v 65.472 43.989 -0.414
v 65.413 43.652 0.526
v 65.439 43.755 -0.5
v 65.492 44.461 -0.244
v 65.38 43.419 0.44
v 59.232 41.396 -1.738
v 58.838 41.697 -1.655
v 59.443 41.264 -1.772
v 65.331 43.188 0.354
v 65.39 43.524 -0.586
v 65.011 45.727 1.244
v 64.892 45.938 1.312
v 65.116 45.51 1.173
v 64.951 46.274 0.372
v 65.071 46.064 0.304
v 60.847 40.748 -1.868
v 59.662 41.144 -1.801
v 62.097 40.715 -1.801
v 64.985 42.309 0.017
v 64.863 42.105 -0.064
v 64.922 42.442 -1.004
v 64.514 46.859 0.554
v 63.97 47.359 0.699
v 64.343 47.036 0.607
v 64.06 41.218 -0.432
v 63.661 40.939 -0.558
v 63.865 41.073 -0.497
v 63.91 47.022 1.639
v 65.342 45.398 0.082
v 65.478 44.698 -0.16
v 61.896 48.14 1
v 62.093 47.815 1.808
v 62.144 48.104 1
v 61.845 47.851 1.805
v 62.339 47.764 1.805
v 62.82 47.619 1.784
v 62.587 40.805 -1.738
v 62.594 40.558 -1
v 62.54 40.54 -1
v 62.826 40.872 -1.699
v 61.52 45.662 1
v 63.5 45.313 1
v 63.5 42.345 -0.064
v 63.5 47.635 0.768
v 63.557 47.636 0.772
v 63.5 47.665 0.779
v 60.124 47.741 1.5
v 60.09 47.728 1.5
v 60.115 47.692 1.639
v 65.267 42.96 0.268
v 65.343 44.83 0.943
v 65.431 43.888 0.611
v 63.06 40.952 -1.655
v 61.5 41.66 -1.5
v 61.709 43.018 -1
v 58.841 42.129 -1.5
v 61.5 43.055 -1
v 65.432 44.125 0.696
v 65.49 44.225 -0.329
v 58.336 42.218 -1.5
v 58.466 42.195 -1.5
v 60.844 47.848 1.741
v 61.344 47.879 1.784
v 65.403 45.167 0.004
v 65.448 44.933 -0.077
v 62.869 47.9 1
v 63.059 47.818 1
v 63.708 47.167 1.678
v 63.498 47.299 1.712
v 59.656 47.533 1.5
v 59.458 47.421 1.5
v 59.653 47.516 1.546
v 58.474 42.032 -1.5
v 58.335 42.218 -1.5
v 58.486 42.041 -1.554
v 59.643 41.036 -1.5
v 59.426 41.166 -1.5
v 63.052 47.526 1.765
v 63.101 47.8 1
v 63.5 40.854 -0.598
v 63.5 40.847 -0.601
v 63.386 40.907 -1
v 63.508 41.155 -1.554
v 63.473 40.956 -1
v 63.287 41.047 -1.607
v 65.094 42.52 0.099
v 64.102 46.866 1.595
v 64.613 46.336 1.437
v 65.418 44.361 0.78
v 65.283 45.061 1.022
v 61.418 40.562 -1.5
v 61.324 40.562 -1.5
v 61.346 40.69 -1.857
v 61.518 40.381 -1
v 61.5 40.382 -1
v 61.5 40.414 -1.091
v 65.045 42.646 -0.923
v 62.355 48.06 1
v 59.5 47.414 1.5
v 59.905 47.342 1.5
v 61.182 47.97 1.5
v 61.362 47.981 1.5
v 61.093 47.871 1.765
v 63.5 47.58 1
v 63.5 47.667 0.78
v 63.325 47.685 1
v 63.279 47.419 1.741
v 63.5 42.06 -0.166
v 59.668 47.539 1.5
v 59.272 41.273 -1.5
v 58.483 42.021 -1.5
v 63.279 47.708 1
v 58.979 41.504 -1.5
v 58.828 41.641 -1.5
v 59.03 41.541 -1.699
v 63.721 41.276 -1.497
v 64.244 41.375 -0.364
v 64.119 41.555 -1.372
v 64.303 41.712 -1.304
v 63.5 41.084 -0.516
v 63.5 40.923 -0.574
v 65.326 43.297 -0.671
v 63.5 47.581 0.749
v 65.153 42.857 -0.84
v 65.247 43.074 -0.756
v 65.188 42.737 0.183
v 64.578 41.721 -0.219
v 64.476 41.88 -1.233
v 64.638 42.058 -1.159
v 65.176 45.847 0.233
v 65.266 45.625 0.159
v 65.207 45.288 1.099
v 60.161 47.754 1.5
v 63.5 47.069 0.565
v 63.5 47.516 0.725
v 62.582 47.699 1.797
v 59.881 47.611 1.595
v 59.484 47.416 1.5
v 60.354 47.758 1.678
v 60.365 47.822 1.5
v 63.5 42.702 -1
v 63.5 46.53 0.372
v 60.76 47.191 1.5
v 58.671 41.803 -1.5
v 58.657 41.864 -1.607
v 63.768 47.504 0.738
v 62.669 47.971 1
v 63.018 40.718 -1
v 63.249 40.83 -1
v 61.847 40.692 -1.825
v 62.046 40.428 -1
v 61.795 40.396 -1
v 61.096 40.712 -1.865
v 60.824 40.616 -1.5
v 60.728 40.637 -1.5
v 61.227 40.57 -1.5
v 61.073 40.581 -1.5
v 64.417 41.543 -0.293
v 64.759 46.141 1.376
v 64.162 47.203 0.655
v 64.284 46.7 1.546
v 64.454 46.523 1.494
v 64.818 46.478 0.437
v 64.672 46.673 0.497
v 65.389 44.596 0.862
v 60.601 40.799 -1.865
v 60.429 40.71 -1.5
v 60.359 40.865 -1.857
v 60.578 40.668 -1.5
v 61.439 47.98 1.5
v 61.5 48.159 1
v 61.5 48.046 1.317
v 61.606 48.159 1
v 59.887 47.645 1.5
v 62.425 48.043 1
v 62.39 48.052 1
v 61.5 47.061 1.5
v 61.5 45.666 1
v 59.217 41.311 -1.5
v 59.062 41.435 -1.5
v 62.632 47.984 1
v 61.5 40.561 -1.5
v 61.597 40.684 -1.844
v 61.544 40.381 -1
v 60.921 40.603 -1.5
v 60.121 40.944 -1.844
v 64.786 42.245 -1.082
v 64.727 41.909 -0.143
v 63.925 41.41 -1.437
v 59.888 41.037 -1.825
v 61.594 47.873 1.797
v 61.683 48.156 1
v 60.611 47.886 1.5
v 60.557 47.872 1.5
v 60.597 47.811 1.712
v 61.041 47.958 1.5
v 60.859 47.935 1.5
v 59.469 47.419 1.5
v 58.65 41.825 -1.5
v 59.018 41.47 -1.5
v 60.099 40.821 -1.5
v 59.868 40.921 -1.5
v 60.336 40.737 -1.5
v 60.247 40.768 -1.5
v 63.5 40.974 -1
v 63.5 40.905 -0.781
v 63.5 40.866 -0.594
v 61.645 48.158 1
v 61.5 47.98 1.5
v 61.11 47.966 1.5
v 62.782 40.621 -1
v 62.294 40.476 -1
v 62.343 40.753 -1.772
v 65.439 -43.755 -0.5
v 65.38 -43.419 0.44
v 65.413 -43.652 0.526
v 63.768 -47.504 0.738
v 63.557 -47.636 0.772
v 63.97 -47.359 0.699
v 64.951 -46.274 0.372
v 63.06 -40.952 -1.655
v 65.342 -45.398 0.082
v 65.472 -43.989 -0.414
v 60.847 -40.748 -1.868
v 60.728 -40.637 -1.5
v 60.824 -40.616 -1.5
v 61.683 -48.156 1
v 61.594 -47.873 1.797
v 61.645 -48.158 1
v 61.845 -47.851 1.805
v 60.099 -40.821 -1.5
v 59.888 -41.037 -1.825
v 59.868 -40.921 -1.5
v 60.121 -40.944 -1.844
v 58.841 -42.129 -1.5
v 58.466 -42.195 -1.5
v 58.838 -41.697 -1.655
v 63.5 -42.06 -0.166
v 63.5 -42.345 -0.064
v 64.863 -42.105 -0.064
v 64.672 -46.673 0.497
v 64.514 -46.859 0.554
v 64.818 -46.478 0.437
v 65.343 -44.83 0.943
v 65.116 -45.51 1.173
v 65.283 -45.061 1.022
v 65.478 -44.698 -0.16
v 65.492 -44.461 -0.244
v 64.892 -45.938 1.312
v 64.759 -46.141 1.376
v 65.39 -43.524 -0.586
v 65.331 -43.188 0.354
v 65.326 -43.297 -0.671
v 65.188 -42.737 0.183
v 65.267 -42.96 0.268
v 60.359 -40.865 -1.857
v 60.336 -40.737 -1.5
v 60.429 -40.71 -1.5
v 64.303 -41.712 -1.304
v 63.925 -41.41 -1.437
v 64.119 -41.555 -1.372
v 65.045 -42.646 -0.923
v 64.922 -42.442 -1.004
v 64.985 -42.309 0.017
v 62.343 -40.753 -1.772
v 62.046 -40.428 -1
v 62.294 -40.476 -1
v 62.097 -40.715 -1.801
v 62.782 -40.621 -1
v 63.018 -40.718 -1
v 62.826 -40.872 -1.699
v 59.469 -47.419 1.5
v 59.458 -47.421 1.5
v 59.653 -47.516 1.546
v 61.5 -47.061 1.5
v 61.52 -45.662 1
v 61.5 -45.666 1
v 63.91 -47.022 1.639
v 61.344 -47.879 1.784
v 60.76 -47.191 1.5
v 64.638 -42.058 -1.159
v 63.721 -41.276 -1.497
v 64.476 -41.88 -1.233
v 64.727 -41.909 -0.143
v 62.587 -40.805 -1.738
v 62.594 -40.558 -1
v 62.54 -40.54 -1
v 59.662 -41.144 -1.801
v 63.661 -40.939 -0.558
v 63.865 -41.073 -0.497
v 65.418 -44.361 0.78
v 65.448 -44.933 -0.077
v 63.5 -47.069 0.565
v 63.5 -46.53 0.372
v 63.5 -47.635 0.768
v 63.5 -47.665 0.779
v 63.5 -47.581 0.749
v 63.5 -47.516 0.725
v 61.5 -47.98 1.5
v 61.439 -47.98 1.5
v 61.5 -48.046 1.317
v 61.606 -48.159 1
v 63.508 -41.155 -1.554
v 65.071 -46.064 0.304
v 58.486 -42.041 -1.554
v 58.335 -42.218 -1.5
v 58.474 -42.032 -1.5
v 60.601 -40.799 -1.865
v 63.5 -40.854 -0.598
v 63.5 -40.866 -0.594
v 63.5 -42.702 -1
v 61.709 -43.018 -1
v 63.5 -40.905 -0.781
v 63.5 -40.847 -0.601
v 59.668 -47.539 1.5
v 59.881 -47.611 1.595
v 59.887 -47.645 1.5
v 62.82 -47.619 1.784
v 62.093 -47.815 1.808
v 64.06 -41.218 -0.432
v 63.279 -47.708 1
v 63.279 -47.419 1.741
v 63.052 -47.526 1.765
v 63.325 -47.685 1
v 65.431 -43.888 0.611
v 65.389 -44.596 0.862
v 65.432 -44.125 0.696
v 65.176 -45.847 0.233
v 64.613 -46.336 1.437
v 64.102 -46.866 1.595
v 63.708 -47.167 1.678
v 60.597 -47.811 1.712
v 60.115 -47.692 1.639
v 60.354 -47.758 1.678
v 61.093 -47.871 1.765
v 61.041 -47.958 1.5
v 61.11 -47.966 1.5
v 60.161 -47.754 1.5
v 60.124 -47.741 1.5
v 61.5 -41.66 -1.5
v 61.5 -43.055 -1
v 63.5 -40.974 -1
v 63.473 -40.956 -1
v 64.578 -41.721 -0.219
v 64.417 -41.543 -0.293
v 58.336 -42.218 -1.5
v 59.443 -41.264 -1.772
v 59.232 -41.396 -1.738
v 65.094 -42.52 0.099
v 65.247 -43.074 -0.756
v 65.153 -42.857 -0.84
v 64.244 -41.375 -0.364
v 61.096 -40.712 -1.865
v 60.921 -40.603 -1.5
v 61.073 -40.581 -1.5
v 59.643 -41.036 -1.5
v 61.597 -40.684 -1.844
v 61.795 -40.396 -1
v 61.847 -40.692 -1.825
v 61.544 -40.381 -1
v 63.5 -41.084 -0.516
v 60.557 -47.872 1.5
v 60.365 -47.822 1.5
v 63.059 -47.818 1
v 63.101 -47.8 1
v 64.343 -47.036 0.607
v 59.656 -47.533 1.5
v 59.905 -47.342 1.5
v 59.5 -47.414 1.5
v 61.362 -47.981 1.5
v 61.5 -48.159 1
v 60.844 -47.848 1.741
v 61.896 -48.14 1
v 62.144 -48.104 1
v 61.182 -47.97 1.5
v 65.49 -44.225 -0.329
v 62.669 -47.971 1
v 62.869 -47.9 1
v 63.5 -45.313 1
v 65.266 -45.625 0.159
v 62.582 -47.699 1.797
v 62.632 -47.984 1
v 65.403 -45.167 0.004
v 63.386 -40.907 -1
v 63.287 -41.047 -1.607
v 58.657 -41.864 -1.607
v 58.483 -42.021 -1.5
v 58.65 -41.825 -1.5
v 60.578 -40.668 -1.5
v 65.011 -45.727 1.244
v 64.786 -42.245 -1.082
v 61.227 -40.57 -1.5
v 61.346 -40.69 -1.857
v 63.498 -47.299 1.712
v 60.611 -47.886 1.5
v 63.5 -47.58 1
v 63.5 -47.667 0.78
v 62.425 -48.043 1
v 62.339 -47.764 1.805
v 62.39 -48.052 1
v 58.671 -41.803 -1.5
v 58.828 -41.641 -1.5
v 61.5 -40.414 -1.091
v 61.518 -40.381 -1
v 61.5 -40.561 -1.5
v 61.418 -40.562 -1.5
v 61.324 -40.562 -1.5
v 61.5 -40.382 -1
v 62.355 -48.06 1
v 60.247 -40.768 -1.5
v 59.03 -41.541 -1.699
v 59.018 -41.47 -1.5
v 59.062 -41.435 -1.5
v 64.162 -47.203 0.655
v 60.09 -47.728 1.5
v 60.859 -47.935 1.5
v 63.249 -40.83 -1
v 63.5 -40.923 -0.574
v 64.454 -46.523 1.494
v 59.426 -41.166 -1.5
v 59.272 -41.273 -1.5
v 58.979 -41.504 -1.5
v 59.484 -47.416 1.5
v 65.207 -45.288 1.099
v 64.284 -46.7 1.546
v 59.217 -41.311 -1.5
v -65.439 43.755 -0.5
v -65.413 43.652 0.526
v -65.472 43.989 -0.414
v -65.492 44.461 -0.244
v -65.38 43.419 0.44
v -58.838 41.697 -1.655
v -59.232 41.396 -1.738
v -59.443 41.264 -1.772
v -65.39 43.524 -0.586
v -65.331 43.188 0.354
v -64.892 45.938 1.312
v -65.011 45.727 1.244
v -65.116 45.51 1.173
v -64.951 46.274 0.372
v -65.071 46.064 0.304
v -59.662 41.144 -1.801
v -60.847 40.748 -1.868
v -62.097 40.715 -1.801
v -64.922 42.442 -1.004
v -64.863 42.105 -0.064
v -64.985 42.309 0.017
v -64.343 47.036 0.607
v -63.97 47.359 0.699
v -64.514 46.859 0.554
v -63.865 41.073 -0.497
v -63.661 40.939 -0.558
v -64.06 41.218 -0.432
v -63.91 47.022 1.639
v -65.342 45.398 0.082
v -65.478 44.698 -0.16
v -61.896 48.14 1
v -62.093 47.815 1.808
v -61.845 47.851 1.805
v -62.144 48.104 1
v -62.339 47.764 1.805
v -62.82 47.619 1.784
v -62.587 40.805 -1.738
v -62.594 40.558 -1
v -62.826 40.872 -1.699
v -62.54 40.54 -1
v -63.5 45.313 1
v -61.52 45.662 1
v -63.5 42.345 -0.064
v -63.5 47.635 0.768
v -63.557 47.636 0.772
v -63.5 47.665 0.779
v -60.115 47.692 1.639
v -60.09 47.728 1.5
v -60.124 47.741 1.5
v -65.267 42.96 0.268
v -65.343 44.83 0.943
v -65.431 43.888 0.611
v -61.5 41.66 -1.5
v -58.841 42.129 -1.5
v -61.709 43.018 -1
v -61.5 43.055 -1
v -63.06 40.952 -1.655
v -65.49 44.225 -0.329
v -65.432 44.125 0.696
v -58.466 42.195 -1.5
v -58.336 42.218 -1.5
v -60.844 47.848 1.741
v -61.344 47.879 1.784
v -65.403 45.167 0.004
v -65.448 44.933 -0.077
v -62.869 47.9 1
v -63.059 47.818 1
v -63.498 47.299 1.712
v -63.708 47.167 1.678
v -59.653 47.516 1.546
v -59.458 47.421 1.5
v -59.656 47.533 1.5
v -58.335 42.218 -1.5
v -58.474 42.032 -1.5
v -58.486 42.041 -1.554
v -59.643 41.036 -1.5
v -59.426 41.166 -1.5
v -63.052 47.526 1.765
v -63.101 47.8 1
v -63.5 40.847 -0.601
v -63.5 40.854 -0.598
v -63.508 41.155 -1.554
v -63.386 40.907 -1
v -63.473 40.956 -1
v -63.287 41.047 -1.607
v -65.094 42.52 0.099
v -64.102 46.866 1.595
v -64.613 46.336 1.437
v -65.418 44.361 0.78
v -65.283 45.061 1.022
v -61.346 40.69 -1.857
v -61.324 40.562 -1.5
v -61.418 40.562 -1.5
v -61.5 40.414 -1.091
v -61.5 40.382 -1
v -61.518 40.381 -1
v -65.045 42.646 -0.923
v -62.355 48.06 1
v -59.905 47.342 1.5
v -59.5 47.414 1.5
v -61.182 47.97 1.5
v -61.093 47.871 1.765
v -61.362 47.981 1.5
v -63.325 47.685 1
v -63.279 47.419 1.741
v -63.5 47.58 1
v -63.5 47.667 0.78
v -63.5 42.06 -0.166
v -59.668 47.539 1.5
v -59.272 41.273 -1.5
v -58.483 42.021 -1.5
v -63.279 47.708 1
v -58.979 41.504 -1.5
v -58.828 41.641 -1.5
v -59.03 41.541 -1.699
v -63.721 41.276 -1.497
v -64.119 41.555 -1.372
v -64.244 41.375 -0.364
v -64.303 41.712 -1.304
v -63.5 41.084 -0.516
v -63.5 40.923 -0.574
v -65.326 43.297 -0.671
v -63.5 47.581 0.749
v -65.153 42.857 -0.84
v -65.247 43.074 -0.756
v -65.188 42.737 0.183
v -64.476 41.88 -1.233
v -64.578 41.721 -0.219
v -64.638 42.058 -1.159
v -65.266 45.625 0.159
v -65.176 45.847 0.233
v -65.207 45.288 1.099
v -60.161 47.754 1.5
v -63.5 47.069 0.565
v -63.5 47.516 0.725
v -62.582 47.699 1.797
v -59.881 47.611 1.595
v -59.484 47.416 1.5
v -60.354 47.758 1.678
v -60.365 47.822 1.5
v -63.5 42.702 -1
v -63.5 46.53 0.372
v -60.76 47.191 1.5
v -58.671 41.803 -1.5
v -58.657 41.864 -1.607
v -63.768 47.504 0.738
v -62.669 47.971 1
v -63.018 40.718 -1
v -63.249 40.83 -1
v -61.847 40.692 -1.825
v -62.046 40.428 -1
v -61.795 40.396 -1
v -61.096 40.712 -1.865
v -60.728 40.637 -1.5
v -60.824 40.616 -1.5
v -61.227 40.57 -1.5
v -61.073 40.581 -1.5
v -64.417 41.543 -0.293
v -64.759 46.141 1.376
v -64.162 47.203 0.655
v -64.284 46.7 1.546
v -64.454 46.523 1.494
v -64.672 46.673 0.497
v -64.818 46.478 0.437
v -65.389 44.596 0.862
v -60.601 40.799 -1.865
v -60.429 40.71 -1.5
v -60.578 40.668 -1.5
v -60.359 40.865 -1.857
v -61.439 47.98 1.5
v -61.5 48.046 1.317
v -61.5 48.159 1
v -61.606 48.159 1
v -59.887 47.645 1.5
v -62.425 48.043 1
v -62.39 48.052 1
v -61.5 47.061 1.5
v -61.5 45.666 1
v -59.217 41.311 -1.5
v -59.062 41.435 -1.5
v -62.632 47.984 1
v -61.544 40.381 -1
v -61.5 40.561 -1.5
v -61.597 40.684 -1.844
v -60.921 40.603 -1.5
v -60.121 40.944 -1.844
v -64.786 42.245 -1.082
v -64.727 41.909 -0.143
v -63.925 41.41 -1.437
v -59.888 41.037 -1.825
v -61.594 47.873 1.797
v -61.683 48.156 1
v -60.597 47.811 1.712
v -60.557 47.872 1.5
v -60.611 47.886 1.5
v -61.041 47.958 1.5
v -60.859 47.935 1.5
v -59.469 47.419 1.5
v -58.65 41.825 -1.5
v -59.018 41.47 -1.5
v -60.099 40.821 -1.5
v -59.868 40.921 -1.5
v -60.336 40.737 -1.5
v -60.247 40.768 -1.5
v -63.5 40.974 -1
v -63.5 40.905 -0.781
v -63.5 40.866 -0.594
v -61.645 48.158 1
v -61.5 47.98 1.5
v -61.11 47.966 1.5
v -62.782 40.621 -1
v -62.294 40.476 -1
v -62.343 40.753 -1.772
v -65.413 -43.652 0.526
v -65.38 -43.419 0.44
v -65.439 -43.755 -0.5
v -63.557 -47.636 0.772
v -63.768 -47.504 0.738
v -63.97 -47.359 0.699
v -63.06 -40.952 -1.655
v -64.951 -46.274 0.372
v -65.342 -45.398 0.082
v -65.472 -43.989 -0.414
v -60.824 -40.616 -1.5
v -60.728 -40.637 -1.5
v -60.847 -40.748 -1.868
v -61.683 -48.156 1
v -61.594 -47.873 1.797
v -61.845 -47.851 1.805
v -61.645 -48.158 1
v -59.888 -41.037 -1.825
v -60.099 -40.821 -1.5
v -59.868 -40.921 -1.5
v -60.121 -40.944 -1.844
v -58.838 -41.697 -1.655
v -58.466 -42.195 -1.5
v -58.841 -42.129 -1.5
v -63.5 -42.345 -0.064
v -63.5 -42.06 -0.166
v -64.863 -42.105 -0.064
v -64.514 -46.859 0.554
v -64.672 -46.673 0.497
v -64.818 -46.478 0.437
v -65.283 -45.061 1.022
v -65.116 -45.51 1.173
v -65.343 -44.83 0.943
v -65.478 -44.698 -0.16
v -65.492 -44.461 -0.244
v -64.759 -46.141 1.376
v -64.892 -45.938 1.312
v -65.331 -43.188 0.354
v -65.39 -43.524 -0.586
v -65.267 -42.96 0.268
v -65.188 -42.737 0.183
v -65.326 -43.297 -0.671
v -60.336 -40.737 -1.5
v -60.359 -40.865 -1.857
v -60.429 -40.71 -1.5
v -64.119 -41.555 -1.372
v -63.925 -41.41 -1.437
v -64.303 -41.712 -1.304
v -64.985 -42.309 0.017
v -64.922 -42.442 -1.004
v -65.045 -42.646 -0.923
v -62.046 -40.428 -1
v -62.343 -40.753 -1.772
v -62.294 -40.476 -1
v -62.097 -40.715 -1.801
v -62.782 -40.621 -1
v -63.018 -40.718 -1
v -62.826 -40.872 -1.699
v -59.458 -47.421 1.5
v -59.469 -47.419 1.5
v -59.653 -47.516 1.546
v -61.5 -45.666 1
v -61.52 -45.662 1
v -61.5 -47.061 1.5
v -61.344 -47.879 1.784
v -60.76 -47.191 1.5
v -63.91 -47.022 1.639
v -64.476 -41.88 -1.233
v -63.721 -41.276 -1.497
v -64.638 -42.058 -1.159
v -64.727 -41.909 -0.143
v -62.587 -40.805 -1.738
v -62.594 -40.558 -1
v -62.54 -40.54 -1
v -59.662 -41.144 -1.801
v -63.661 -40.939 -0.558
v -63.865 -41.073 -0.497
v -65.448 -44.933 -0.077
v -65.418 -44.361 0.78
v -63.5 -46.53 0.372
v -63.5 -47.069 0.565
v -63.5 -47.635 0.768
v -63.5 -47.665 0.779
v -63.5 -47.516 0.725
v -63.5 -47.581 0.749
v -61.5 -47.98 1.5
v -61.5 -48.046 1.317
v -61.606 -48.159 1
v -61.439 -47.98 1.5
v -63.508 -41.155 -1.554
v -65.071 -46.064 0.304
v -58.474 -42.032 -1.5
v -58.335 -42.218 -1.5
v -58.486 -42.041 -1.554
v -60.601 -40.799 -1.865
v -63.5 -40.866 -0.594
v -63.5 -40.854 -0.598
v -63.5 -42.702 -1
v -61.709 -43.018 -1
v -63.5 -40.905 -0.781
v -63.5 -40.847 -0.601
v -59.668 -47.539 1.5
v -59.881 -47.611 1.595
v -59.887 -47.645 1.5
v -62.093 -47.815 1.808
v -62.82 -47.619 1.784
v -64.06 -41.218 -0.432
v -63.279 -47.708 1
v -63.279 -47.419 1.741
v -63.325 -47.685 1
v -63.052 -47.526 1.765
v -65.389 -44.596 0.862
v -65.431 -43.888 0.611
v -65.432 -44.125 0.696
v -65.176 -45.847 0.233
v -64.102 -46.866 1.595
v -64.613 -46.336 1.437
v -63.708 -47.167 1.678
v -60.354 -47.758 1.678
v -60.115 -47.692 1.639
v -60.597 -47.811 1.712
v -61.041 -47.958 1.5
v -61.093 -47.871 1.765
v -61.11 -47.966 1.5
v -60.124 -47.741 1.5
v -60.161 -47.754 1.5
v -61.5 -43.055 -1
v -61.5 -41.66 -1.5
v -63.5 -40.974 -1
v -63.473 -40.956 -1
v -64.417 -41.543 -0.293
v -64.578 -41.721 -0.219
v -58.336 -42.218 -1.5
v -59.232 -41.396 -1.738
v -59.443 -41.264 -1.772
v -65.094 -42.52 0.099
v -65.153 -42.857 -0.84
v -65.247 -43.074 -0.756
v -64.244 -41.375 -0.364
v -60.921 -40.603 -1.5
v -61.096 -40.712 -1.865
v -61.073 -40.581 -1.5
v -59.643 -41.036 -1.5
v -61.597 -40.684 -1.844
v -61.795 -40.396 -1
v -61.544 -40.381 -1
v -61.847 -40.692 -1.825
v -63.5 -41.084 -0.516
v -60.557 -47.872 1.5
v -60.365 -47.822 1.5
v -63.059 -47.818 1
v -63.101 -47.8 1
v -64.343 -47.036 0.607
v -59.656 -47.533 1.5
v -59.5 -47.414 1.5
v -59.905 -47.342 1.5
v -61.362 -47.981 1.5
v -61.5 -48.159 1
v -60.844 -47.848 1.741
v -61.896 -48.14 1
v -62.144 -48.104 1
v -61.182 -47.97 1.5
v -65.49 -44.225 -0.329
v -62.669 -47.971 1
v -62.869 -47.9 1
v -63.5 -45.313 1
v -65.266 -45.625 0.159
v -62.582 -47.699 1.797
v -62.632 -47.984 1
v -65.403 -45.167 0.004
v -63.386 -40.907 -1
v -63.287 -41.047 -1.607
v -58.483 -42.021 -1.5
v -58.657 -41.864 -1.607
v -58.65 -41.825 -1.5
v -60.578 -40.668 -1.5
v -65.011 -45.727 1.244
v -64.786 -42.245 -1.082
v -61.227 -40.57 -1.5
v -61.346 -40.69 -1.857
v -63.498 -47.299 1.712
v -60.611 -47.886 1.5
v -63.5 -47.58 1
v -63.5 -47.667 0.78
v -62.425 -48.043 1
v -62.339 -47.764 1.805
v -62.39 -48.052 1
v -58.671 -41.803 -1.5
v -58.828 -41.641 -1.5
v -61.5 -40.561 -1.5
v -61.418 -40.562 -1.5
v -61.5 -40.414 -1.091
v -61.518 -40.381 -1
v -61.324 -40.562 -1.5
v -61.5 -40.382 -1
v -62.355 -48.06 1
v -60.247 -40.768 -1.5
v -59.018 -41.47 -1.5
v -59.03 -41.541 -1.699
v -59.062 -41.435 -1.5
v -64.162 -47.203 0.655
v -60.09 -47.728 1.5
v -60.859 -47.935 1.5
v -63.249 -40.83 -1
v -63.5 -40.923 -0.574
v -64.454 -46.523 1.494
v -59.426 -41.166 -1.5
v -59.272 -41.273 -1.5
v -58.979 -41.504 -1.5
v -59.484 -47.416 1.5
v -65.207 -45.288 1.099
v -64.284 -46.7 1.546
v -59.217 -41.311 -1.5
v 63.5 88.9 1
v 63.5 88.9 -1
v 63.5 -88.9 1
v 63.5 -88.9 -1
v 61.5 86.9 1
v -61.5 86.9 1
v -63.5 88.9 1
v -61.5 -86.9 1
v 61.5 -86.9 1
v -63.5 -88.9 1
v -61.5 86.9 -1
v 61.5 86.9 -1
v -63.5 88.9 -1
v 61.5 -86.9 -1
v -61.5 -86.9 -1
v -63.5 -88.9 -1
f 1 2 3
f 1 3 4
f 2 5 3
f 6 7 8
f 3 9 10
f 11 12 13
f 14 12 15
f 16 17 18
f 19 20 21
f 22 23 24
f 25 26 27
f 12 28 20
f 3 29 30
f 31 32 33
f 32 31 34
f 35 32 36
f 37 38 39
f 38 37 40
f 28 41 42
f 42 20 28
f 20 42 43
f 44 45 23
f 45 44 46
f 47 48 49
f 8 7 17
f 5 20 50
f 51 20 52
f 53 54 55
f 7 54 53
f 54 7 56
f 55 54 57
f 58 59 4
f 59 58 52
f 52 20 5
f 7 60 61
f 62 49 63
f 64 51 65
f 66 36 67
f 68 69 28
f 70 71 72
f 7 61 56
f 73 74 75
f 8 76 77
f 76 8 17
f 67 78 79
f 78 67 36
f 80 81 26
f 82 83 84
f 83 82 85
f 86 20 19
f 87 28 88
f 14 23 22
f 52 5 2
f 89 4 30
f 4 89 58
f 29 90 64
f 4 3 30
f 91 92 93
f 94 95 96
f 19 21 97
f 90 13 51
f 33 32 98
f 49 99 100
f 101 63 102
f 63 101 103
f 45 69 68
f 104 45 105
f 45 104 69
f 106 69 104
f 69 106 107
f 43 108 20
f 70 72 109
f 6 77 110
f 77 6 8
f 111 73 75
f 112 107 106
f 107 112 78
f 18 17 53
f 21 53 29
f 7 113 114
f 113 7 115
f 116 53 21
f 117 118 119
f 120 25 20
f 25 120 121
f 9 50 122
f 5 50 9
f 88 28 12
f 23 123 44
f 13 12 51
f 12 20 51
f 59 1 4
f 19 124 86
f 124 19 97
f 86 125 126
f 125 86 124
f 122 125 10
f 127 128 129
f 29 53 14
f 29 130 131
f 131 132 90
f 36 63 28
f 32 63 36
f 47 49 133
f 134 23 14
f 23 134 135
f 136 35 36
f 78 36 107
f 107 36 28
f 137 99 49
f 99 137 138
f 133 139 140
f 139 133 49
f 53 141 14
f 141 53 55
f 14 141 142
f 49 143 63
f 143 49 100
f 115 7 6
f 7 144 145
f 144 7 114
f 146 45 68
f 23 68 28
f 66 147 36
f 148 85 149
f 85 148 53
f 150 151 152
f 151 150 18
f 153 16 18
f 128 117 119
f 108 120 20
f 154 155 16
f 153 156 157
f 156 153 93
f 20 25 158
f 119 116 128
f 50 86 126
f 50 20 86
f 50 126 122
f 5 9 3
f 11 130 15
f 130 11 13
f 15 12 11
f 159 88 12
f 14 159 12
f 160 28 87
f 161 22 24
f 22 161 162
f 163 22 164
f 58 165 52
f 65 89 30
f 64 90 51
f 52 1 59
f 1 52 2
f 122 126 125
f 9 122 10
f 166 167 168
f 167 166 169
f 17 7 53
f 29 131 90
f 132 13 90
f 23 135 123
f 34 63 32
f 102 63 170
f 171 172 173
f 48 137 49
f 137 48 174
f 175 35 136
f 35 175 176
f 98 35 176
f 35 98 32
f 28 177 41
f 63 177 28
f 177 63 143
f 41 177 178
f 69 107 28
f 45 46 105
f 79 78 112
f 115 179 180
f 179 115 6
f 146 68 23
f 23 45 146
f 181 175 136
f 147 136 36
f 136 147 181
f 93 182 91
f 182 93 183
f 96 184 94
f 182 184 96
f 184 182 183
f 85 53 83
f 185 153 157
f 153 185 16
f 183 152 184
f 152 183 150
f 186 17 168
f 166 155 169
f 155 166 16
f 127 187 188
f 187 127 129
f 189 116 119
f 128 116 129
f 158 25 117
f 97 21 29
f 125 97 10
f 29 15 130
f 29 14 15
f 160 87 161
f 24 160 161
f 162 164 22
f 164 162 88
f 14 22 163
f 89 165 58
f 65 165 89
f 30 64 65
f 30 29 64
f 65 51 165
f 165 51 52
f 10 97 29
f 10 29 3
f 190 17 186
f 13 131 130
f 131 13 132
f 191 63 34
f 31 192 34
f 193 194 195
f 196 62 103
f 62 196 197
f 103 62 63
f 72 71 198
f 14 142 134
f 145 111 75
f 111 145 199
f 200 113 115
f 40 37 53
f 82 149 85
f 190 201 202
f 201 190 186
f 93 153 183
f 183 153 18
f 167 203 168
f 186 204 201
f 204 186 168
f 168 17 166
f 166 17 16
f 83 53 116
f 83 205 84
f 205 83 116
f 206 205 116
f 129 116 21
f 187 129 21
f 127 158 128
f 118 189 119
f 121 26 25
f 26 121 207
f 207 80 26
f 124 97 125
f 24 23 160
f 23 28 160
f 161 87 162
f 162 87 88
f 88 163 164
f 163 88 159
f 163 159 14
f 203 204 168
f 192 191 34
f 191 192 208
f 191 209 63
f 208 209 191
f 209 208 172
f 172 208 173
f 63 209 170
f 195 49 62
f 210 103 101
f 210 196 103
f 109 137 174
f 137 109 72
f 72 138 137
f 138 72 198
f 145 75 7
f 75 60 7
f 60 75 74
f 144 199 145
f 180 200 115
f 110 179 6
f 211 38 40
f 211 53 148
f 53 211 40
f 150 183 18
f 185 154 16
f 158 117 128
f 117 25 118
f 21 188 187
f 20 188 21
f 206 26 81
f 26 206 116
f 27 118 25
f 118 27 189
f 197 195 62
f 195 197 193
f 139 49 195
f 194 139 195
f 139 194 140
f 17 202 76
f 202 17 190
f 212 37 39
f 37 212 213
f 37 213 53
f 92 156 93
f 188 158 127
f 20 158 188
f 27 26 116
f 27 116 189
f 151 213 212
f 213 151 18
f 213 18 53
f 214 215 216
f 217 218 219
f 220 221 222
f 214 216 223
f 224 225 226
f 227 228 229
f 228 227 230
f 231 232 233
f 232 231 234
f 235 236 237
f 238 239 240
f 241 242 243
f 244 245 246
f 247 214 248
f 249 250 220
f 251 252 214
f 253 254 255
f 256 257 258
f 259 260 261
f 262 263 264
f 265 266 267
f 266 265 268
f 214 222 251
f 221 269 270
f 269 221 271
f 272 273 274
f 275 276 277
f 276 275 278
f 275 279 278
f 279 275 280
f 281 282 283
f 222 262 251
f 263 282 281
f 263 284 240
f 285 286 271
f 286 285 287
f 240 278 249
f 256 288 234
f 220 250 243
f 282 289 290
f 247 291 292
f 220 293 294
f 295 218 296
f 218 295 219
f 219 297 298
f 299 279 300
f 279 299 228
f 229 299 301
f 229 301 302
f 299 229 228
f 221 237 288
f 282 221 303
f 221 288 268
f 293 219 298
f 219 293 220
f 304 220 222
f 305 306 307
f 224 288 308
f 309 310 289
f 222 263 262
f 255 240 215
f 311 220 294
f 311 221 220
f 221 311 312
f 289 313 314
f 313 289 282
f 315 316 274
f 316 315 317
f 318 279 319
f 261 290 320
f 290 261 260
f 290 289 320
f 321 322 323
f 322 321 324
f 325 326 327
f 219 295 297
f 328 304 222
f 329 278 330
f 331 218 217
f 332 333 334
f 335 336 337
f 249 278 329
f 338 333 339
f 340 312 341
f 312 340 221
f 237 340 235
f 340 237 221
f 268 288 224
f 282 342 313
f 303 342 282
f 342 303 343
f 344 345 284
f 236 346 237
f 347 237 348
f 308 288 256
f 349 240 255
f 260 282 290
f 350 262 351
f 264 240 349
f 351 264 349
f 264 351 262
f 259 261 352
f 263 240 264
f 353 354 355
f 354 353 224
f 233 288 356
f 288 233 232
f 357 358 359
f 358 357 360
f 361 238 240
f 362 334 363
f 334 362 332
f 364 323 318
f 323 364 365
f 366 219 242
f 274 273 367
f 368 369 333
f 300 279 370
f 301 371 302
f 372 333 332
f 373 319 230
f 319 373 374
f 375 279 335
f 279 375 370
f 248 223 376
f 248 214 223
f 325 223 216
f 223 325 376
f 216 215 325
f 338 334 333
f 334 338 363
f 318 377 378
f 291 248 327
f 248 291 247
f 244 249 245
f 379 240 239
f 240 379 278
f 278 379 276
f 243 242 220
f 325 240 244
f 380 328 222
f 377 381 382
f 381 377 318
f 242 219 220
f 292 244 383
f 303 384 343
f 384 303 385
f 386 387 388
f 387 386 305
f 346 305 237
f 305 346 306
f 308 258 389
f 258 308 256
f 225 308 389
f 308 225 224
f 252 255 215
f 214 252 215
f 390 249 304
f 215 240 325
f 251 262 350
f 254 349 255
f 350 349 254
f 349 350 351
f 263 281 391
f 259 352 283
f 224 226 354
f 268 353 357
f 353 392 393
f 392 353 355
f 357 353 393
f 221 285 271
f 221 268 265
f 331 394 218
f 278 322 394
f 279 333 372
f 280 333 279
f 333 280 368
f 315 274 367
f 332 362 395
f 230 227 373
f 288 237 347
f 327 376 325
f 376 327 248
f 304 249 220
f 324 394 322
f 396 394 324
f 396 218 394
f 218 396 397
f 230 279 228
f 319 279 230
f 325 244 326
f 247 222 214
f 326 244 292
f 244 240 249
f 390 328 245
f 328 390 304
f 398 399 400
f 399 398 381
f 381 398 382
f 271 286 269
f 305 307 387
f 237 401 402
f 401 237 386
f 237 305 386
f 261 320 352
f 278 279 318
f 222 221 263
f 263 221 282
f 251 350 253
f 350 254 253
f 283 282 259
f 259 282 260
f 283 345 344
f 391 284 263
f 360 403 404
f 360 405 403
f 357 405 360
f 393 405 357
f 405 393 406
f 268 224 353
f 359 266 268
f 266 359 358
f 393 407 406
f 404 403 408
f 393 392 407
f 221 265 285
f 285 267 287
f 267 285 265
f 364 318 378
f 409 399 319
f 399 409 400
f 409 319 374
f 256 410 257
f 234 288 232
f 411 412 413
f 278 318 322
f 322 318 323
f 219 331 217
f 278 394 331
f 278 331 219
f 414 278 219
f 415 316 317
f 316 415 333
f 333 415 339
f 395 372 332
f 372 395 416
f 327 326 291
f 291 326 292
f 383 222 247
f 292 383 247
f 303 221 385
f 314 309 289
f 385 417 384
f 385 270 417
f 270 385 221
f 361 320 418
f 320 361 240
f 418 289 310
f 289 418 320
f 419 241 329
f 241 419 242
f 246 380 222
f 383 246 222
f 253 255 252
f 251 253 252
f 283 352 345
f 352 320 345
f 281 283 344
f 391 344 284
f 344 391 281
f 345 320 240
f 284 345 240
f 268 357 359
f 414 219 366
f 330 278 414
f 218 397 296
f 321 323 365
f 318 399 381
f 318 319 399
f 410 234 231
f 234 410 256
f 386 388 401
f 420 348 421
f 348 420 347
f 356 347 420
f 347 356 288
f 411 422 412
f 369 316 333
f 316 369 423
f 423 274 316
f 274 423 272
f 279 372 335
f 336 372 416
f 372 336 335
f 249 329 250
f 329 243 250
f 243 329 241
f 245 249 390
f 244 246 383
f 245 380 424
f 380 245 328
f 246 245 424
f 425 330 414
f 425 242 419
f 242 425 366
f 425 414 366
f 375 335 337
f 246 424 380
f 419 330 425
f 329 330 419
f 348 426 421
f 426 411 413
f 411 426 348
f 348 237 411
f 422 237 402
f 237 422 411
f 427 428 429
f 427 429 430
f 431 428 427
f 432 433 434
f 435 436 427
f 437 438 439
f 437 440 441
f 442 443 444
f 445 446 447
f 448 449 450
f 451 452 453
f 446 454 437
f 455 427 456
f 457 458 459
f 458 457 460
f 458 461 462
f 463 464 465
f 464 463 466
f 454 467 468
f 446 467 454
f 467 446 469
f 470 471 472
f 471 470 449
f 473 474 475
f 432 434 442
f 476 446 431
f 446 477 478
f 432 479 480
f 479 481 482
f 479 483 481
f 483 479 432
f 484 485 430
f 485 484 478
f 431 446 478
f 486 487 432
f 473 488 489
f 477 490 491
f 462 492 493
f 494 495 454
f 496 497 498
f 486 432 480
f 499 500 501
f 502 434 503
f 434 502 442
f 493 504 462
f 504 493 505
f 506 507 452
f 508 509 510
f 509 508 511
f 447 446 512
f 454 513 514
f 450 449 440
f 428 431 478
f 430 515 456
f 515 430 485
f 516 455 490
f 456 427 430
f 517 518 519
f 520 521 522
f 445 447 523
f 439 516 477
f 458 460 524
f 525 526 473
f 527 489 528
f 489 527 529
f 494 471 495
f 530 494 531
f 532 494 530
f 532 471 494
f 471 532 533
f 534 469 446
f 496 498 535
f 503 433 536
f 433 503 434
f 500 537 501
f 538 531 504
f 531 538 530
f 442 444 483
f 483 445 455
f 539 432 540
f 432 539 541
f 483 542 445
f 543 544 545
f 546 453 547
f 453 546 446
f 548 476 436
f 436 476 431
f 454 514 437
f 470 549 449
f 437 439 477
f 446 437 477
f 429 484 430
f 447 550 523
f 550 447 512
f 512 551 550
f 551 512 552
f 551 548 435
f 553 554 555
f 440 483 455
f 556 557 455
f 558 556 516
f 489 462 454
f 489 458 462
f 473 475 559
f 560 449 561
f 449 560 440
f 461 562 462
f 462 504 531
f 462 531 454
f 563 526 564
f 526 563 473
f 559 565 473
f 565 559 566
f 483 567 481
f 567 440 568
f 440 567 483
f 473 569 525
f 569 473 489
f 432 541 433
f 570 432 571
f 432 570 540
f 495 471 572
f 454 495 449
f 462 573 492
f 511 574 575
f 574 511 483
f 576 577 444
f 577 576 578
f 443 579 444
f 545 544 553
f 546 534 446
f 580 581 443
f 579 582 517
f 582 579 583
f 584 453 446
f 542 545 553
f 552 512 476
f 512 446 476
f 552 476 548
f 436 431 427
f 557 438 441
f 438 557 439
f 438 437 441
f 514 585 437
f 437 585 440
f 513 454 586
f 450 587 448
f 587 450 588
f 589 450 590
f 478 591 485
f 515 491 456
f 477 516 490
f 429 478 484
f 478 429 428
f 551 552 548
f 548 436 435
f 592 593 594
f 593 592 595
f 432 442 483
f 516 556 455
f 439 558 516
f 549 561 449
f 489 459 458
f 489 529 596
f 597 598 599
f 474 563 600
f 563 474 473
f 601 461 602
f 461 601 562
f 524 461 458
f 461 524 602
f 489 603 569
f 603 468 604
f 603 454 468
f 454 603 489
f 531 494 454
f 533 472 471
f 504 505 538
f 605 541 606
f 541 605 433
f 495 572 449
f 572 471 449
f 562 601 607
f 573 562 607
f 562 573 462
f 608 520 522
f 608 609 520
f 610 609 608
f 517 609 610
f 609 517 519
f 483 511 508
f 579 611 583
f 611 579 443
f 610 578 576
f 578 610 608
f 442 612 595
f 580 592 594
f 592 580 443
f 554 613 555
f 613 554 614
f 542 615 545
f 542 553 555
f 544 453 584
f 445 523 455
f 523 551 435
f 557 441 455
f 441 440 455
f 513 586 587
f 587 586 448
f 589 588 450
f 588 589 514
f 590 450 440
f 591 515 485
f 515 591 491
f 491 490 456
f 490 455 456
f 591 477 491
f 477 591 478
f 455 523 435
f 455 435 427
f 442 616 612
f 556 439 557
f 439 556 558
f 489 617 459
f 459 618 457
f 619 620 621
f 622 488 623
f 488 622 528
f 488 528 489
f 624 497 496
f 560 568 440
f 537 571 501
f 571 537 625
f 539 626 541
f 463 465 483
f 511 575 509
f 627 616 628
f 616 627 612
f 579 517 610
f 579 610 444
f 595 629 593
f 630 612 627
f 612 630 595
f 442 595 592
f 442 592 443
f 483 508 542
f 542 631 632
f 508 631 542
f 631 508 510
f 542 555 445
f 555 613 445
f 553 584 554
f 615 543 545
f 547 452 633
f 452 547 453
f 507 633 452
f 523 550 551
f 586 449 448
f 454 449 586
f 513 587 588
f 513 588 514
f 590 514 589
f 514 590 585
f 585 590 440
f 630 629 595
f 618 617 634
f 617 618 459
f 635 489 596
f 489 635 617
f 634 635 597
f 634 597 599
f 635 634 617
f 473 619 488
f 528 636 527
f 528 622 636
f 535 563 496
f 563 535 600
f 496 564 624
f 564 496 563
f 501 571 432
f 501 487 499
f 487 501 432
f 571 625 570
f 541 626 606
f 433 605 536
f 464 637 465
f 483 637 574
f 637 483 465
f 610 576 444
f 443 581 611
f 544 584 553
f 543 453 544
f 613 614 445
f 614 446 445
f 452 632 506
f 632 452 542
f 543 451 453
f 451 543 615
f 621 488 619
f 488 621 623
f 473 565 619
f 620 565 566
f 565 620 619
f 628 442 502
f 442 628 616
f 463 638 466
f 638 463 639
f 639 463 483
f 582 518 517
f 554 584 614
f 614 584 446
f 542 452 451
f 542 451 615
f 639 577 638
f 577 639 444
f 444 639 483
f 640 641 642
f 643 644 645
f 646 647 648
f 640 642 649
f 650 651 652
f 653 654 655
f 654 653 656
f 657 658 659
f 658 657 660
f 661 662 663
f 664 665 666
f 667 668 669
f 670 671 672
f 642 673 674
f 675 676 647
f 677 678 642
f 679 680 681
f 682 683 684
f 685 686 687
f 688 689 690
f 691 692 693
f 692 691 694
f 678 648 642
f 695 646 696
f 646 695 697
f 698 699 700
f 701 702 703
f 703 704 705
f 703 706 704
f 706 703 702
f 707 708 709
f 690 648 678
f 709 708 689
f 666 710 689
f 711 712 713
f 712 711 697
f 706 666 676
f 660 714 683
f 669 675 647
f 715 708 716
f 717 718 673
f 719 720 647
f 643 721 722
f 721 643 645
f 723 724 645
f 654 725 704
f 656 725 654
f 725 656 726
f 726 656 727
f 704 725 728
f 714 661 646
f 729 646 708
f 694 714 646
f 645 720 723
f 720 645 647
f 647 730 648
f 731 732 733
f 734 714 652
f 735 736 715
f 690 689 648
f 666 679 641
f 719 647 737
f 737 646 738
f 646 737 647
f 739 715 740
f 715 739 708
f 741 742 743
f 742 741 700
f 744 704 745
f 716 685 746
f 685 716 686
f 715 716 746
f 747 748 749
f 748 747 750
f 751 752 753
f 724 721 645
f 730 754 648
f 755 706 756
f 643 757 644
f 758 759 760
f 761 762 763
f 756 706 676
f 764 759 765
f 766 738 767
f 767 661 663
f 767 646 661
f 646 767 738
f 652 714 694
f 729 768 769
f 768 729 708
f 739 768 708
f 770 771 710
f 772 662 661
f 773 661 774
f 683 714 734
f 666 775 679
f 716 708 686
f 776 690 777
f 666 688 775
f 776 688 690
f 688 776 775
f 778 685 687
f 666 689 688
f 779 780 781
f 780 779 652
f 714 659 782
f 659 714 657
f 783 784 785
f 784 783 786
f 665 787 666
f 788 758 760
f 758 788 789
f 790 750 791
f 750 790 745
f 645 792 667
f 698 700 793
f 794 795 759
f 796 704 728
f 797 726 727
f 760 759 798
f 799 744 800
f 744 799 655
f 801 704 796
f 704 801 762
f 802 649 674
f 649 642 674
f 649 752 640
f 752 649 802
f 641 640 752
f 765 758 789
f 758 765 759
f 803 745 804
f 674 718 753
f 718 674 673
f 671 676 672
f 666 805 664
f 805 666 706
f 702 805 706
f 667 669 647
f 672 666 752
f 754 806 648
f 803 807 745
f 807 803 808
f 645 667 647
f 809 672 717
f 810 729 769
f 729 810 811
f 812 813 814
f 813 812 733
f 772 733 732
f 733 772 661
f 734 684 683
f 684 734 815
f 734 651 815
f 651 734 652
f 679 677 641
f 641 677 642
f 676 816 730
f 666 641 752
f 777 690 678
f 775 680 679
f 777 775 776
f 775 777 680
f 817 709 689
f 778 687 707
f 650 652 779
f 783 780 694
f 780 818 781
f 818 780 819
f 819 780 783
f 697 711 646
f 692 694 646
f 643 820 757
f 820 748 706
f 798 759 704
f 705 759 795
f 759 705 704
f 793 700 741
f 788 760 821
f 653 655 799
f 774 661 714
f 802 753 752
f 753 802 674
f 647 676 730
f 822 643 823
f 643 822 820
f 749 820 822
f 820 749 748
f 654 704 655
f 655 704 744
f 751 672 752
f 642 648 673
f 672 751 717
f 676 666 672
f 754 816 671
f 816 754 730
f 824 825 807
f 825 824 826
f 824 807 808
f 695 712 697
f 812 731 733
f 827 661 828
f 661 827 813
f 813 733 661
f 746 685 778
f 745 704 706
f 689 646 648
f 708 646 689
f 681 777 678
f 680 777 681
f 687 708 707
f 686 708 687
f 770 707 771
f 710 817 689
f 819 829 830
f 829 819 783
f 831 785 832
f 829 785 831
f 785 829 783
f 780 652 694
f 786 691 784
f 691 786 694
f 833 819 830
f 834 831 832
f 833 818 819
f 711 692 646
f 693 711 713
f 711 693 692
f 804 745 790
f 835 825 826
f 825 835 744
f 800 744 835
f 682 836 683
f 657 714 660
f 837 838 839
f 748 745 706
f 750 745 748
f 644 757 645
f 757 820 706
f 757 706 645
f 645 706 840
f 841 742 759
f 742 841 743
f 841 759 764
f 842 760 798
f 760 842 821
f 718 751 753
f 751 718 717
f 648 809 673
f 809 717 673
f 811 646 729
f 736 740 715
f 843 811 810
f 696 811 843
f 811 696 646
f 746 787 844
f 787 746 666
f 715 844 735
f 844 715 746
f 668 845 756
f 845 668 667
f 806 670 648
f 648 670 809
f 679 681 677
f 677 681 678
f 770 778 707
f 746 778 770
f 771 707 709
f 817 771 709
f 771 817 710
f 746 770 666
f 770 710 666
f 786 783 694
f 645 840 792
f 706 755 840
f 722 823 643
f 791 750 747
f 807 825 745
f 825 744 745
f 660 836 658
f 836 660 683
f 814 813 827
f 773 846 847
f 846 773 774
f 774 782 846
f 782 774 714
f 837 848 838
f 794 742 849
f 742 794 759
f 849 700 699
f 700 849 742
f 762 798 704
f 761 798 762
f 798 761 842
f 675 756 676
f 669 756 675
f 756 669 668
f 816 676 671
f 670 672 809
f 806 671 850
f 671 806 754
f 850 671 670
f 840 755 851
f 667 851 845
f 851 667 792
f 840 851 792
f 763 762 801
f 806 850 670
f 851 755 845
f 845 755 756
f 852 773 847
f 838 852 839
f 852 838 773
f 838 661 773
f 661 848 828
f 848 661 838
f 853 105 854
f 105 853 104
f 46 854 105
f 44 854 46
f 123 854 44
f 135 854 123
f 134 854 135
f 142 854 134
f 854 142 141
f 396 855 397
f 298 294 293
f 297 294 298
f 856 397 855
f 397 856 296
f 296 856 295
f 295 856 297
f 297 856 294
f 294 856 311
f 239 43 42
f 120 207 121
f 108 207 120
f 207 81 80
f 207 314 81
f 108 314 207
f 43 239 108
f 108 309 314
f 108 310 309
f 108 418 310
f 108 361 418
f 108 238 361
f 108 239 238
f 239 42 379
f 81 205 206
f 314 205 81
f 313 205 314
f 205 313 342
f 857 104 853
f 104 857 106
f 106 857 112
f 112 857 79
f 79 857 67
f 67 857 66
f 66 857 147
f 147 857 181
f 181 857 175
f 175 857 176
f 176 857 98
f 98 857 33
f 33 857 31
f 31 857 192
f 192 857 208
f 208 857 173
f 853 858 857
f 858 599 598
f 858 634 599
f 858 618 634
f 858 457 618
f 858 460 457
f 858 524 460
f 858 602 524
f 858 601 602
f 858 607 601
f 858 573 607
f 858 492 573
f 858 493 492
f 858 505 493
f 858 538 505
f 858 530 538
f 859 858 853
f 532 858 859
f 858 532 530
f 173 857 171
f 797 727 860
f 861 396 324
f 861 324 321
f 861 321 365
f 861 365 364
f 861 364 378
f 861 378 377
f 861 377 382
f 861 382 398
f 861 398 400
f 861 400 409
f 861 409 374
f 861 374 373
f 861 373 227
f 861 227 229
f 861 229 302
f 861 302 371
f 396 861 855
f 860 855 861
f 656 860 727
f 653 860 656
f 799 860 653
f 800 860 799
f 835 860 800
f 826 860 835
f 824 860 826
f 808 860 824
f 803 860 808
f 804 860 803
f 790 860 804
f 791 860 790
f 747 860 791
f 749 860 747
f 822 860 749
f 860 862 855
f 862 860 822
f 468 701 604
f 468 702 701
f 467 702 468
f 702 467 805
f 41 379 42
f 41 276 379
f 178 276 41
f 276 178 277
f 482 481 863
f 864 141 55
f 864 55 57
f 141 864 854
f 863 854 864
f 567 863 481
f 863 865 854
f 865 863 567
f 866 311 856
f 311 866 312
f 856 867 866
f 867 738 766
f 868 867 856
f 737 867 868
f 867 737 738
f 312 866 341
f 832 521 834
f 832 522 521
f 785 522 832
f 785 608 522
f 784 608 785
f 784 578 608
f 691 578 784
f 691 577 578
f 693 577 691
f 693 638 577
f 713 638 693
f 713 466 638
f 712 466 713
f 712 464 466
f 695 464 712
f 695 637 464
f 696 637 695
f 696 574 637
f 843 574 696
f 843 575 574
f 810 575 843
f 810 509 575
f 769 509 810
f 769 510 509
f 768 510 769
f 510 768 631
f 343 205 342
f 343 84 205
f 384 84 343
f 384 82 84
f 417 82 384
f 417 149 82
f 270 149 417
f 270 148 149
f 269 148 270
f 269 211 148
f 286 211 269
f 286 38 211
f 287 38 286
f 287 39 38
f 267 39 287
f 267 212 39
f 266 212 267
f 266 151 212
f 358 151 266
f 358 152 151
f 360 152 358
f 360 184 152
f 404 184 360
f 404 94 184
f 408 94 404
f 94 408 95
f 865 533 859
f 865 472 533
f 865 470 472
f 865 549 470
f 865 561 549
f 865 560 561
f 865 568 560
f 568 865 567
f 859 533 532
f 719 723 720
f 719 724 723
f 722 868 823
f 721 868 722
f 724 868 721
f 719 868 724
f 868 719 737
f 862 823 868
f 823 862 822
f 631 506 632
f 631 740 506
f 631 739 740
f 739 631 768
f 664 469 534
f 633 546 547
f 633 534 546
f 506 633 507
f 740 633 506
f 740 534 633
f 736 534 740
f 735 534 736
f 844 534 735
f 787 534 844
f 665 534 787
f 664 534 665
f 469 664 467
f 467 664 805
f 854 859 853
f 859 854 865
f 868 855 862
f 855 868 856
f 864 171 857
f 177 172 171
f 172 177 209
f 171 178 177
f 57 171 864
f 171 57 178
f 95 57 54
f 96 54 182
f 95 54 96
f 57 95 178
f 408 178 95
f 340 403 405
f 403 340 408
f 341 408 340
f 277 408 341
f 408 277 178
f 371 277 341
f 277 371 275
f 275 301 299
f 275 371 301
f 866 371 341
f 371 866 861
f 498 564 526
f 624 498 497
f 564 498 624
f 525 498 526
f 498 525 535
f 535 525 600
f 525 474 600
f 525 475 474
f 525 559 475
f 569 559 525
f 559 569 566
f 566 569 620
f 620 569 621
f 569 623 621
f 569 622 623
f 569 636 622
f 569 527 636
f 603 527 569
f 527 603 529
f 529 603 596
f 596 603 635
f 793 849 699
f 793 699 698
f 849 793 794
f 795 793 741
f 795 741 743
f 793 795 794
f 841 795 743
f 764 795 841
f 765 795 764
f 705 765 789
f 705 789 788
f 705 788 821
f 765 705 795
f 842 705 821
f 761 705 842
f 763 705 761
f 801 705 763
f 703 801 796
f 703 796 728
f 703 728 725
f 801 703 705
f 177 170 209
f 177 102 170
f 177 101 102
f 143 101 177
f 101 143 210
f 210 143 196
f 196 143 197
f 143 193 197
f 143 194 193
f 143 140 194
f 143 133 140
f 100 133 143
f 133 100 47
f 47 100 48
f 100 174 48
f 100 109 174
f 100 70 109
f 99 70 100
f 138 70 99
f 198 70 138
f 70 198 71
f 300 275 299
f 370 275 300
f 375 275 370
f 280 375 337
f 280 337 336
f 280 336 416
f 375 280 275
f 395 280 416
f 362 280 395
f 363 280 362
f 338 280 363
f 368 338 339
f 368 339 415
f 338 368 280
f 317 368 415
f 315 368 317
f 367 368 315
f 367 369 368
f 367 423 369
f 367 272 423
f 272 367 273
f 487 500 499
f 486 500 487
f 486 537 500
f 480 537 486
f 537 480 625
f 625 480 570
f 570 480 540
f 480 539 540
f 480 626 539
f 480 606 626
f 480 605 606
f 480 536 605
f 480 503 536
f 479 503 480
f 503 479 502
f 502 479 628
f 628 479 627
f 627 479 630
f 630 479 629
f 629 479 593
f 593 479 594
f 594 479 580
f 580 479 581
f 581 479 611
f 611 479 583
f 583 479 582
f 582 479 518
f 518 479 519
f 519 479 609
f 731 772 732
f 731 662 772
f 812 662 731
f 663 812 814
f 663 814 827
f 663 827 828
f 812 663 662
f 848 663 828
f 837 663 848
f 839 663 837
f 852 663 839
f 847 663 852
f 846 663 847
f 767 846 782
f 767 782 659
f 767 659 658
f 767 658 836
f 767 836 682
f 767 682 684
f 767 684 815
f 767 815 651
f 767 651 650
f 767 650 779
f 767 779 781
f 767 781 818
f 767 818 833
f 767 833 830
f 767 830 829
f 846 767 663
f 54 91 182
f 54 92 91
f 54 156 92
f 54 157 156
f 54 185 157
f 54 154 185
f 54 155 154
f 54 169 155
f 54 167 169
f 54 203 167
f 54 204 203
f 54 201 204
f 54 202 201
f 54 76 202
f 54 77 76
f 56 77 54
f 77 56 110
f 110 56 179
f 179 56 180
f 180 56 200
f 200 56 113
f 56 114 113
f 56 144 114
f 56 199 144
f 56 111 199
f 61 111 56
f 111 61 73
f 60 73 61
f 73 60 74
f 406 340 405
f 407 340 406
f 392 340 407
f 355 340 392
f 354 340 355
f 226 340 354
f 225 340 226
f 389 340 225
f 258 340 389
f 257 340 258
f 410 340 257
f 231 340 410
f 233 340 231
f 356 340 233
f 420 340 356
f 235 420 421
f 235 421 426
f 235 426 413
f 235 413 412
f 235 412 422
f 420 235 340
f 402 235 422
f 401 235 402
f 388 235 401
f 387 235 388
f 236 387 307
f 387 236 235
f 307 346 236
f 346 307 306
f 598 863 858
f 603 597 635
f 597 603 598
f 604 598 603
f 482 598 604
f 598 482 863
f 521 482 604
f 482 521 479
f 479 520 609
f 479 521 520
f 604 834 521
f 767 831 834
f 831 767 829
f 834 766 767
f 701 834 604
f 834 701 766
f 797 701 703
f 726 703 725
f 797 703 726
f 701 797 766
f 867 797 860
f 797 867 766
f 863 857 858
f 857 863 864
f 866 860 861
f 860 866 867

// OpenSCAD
$fn=100;
frame_width = 127;
frame_height = 177.8;
ring_depth = 2;
ring_width=2;
clip_len = 20;
clip_heigth = 1;
clip_width=3;
clip_v_angle = 20;
clip_h_angle = 10;


module mirror_copy(vec=[1,0,0])
{
    children();
    mirror(vec) children();
}


difference(){
    union(){
        cube([frame_width, frame_height, ring_depth], center=true);

        mirror_copy()mirror_copy([0,1,0])translate([frame_width/2-ring_width, frame_height/4, clip_heigth/2-ring_depth/2])rotate([clip_v_angle,0,-clip_h_angle])
        {cylinder(r=4);
        }
        // // length clips
        // {
        //     union(){
        //         cube([ring_width, clip_len, clip_heigth],center=false);
        //         translate([clip_width/2,5/8*clip_len,0])minkowski()
        //                     {
        //                     cube([clip_width/2,clip_len*3/8,clip_heigth/2], center=false);
        //                     cylinder(r=clip_width/2,h=clip_heigth/2, center=false);
        //                     }
        //         translate([0,7/8*clip_len-clip_heigth,2])rotate([0,90,0])minkowski()
        //                     {
        //                     cube([clip_heigth,clip_len/8,.5], center=false);
        //                     cylinder(r=clip_heigth/2,h=.5, center=false);
        //                     }
        //     }
        // }
        // mirror_copy()mirror_copy([0,1,0])translate([frame_width/4, frame_height/2-ring_width, clip_heigth/2-ring_depth/2])rotate([clip_v_angle,0,90-clip_h_angle])
        // // length clips
        // {
        //     union(){
        //         cube([ring_width, clip_len, clip_heigth],center=false);
        //         translate([clip_width/2,5/8*clip_len,0])minkowski()
        //                     {
        //                     cube([clip_width/2,clip_len*3/8,clip_heigth/2], center=false);
        //                     cylinder(r=clip_width/2,h=clip_heigth/2, center=false);
        //                     }
        //         translate([0,7/8*clip_len-clip_heigth,2])rotate([0,90,0])minkowski()
        //                     {
        //                     cube([clip_heigth,clip_len/8,.5], center=false);
        //                     cylinder(r=clip_heigth/2,h=.5, center=false);
        //                     }
        //     }
        // }
    }
    cube([frame_width-2*ring_width, frame_height-2*ring_width, ring_depth+1], center=true);
};
